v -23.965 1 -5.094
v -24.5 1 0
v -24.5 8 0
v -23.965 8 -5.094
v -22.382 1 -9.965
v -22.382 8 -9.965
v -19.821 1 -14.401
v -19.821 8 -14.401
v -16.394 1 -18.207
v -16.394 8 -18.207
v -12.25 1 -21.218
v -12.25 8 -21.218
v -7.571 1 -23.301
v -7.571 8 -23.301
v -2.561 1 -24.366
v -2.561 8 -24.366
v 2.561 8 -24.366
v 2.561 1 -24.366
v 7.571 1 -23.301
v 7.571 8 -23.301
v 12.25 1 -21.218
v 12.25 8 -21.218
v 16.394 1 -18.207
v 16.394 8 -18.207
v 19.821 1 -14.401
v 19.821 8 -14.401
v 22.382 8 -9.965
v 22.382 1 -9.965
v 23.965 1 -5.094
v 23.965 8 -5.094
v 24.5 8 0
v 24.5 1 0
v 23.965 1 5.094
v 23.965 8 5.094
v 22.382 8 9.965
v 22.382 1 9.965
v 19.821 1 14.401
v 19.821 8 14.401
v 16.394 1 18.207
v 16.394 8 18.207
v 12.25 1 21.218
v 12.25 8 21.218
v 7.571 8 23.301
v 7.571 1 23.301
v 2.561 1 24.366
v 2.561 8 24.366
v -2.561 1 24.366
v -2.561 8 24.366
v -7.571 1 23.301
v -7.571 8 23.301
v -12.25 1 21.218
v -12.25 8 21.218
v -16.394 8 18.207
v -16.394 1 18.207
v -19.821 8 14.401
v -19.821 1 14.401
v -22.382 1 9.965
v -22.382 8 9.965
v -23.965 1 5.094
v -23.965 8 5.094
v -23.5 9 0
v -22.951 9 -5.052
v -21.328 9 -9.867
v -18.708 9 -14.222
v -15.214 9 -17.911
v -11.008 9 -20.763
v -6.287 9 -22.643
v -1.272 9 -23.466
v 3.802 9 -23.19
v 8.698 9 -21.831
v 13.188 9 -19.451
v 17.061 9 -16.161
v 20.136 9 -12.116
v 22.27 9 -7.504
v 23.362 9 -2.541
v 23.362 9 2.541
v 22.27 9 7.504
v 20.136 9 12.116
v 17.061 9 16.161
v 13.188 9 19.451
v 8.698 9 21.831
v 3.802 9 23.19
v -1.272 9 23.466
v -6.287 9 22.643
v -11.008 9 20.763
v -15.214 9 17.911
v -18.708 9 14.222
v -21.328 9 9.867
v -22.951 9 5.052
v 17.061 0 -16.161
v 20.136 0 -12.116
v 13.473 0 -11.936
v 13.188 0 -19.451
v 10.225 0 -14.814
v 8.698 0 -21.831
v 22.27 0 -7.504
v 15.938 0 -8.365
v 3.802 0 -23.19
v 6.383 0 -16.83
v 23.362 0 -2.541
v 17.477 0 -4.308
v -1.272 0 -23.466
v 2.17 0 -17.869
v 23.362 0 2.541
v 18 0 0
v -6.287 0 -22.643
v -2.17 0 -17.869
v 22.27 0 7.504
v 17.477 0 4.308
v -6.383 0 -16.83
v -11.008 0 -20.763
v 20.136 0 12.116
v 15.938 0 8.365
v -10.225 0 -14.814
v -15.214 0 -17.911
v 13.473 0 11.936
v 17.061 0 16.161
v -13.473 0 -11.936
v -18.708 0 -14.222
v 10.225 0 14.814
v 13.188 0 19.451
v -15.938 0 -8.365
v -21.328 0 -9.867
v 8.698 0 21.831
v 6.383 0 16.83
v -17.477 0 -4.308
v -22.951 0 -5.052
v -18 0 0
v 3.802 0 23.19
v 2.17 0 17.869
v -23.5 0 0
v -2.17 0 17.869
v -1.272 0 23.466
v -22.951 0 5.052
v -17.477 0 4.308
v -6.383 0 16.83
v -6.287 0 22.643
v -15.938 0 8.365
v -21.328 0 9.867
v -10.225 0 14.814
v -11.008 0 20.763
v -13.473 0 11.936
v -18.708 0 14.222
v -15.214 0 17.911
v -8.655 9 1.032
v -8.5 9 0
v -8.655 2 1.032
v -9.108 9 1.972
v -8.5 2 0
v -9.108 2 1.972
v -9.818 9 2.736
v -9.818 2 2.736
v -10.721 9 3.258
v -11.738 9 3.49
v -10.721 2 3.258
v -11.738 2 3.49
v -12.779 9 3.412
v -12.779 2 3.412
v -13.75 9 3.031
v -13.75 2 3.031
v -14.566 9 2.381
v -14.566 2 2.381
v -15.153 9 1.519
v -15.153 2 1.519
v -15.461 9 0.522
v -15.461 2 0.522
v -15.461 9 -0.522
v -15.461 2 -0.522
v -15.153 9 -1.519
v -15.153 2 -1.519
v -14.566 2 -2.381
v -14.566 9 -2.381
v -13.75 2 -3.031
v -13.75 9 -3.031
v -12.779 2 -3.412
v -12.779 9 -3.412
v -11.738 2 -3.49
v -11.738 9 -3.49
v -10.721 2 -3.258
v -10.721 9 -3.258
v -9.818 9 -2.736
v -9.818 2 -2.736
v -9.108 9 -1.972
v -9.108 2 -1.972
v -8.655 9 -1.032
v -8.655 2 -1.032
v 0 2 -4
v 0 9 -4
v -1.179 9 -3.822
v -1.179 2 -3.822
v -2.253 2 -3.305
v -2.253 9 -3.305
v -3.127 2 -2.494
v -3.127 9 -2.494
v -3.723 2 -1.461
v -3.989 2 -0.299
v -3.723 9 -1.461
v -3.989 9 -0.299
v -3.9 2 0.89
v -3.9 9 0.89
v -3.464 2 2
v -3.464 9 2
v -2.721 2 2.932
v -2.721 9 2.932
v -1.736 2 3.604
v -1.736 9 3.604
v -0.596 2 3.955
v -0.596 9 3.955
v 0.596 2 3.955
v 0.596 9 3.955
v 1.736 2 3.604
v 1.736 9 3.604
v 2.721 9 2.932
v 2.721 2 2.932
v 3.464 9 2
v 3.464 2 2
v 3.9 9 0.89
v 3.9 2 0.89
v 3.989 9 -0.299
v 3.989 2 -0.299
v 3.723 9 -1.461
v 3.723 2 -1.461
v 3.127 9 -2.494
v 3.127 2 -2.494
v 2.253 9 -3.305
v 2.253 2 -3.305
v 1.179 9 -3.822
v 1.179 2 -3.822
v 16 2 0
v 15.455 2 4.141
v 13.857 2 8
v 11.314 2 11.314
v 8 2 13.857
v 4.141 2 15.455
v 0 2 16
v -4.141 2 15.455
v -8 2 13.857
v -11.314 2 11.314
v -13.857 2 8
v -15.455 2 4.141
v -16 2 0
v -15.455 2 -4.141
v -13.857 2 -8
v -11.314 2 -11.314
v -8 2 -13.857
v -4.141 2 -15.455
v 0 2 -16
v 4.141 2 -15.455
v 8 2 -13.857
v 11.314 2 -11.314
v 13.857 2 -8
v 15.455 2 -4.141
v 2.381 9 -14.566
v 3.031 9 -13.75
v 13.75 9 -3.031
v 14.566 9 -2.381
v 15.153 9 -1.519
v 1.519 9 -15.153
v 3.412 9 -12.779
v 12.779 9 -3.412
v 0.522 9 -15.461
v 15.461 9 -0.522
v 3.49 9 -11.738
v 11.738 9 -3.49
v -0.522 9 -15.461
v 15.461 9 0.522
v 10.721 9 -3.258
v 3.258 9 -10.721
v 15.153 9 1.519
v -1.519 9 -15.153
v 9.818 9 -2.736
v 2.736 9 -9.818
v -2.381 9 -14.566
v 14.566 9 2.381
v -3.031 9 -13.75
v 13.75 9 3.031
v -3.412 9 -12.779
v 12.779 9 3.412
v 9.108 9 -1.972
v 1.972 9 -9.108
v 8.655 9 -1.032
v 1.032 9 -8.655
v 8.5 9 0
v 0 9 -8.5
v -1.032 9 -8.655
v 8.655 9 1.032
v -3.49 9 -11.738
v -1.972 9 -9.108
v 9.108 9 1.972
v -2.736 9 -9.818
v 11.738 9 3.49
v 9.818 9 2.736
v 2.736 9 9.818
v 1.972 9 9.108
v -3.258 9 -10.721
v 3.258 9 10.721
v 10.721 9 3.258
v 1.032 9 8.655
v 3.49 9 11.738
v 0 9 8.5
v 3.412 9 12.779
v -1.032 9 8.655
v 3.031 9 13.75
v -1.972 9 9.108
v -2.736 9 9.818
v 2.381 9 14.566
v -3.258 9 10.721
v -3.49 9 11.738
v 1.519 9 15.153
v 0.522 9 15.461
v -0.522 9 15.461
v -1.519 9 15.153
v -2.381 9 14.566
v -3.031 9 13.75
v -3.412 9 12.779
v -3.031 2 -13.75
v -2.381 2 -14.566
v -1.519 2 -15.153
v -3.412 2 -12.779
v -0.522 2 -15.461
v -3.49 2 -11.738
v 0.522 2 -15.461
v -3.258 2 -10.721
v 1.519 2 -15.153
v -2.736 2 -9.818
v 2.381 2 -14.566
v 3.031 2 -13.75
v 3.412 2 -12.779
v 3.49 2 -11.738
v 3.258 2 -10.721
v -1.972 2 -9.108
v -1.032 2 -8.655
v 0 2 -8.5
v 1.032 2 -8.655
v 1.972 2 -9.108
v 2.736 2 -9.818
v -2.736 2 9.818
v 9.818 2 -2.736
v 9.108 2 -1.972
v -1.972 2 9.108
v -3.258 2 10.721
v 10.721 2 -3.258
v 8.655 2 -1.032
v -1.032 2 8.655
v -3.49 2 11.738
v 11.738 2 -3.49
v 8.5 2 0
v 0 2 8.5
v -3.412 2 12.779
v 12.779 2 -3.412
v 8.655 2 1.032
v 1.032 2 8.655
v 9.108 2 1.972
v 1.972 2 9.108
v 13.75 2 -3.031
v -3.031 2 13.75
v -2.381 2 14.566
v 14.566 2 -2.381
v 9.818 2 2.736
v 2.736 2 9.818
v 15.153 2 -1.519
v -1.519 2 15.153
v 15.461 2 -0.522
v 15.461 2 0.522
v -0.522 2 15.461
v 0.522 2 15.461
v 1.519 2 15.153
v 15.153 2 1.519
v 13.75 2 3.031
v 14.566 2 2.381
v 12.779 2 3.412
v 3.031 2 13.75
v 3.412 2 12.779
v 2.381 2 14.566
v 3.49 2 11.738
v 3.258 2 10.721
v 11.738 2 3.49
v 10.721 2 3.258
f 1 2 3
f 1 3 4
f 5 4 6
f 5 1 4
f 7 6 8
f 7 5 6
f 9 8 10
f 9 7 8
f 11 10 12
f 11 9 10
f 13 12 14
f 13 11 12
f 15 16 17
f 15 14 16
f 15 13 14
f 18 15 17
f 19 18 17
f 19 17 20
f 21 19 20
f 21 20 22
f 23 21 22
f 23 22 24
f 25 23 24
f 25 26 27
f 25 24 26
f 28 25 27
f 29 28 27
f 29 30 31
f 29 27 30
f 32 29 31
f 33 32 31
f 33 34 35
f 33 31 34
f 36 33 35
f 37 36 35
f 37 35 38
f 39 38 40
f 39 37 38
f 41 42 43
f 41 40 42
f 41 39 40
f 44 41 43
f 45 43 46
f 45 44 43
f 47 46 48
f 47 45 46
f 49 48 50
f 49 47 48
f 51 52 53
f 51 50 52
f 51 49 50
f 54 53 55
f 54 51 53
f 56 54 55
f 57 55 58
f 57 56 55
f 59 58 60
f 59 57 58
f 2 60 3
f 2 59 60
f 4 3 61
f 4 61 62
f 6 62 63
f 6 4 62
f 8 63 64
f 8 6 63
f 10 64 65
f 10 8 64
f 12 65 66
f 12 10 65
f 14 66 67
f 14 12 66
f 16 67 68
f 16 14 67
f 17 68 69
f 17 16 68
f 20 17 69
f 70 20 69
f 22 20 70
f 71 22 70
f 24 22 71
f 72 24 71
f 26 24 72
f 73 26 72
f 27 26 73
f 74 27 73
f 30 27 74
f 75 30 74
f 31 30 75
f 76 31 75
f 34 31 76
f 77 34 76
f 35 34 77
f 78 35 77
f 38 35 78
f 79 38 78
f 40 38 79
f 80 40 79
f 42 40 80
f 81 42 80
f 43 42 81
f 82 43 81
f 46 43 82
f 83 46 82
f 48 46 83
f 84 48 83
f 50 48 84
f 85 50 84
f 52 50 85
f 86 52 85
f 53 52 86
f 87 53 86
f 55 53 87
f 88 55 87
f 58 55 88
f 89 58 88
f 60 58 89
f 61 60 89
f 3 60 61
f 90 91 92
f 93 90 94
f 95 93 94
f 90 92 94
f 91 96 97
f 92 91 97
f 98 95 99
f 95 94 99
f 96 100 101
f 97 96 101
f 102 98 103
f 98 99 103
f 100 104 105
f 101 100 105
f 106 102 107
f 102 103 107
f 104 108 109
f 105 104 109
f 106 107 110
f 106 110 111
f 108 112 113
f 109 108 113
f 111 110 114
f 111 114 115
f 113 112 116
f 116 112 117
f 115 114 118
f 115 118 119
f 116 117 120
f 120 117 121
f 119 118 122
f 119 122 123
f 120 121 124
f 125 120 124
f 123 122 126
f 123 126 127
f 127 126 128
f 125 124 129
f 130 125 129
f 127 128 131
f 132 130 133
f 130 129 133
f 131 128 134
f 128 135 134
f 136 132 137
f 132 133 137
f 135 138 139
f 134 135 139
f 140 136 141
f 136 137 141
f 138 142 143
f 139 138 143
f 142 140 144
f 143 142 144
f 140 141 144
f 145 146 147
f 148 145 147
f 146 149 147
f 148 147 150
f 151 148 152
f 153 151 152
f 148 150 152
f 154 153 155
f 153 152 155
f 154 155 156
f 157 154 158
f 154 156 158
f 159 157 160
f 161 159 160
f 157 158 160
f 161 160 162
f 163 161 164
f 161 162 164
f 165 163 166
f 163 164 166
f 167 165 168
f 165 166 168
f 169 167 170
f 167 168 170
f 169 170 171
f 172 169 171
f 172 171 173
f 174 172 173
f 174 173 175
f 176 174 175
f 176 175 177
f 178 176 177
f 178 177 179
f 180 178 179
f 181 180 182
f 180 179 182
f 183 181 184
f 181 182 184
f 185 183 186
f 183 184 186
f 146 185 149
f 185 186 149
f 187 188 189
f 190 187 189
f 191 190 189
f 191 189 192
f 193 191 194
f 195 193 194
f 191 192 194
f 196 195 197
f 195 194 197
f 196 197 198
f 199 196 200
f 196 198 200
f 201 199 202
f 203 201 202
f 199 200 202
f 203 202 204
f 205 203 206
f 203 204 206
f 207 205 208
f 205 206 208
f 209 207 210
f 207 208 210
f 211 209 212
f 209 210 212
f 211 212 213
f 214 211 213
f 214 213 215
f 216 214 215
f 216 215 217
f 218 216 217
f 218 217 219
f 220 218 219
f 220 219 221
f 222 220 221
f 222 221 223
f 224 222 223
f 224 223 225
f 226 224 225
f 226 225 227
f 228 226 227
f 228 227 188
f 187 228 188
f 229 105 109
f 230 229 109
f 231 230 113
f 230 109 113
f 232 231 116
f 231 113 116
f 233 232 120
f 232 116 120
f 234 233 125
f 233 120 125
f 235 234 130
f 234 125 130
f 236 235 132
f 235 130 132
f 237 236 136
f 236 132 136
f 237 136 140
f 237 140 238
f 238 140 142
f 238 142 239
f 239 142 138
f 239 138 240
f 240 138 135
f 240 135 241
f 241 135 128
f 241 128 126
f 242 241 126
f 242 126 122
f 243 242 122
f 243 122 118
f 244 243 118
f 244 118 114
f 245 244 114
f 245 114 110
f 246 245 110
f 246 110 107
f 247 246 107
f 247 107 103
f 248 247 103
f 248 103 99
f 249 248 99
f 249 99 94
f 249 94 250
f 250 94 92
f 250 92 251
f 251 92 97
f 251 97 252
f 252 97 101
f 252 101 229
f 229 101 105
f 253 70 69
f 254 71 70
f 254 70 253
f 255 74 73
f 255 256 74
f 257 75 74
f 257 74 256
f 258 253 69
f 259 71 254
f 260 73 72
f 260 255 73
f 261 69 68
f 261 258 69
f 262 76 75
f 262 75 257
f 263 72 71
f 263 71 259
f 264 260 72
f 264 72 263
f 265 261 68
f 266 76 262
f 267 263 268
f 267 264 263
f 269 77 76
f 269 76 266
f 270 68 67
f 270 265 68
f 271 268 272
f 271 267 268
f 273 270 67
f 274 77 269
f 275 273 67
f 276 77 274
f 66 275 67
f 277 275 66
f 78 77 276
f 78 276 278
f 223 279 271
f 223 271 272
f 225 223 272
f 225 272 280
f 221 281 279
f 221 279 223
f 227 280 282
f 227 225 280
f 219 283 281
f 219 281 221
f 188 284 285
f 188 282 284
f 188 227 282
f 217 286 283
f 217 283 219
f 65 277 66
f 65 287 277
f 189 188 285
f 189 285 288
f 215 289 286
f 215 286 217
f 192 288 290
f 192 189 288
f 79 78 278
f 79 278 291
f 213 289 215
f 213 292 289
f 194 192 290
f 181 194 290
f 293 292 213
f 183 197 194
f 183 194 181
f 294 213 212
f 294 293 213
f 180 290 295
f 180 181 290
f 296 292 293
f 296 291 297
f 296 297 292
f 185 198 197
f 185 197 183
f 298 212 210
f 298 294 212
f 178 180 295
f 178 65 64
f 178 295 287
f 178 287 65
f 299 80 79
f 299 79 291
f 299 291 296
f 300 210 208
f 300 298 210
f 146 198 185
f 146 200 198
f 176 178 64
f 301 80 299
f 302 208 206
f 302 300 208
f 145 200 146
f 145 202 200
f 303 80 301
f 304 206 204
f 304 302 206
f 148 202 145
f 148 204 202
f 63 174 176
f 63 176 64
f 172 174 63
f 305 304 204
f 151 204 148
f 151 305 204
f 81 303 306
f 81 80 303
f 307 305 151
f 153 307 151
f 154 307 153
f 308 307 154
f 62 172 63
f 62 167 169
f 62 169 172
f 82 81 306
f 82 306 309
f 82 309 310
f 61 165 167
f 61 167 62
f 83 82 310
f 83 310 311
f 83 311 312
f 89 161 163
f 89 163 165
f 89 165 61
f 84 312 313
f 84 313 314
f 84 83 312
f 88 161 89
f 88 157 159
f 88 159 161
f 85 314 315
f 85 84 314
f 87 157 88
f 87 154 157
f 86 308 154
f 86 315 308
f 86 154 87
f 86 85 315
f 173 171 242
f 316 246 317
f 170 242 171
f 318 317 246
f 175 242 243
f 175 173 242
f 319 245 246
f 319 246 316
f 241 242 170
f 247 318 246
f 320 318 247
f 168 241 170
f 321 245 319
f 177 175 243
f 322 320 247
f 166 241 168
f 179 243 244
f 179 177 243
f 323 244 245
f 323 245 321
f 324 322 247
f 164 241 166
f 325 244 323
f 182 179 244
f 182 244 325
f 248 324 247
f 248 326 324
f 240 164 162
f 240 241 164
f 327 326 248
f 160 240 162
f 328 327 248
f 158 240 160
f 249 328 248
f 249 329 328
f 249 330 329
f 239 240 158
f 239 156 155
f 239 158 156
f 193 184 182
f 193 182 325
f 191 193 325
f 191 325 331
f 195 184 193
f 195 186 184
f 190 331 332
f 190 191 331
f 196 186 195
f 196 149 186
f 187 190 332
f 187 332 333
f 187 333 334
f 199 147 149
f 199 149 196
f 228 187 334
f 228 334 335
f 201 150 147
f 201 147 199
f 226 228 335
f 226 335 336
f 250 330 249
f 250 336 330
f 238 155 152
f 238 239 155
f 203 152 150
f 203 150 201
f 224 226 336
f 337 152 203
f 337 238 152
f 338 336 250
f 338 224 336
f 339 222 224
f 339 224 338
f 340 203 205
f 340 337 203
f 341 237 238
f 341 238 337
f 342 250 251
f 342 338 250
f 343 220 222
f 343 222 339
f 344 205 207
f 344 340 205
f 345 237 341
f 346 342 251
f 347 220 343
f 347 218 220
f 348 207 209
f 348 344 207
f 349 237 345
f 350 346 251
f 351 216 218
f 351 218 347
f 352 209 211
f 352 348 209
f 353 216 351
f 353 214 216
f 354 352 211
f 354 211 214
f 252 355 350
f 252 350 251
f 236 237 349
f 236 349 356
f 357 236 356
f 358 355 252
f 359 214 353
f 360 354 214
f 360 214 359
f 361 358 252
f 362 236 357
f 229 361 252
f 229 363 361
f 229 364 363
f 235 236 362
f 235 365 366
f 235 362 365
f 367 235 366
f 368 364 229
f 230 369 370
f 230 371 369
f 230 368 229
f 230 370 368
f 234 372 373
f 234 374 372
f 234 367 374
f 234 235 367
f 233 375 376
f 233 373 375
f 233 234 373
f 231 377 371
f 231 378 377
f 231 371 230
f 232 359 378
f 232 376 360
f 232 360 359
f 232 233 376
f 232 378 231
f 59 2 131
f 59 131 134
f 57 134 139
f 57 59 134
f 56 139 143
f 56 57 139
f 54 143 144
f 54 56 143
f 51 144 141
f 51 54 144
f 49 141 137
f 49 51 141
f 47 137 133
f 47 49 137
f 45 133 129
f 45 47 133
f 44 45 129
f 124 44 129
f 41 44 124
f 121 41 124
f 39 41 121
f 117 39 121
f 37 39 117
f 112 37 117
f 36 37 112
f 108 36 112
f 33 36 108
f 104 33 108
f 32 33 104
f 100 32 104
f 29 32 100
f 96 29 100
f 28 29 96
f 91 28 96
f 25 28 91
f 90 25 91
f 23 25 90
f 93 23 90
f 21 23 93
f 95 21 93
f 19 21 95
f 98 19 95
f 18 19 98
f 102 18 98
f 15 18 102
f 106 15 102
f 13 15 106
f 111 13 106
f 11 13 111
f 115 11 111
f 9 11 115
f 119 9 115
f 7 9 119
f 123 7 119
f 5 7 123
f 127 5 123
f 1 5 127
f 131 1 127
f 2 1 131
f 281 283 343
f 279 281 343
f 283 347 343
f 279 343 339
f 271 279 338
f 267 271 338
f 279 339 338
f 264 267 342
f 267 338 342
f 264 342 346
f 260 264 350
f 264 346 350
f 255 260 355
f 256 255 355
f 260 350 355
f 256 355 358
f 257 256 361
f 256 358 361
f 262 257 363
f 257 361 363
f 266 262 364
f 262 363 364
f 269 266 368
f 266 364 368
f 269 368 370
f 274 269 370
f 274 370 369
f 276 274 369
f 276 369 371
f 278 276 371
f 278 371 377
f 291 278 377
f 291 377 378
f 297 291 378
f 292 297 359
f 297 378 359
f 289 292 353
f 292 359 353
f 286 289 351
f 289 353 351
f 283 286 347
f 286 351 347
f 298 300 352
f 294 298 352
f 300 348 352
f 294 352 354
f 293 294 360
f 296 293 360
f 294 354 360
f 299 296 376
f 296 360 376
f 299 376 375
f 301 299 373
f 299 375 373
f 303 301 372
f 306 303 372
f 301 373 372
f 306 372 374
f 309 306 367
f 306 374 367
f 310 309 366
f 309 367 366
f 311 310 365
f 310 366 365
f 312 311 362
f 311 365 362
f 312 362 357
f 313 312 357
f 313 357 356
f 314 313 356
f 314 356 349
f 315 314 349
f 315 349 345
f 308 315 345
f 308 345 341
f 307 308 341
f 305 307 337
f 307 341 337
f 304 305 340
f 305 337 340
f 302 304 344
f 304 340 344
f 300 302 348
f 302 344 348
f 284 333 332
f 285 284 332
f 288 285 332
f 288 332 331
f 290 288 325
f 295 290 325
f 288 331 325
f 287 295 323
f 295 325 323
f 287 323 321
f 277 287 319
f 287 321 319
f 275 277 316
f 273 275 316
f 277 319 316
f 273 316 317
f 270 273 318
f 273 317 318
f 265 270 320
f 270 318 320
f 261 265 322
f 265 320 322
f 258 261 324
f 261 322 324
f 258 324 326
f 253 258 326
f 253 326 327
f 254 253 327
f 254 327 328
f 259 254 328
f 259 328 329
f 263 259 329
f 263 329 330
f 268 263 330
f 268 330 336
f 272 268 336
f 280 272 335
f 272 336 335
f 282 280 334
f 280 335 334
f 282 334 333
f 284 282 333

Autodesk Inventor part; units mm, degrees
ref_plane "YZ Plane" through (0, 0, 0) normal (1, 0, 0) x (0, 1, 0)
ref_plane "XZ Plane" through (0, 0, 0) normal (0, 1, 0) x (-1, 0, 0)
ref_plane "XY Plane" through (0, 0, 0) normal (0, 0, 1) x (1, 0, 0)
sketch "Sketch1" plane through (0, 0, 0) normal (0, 1, 0) x (-1, 0, 0)
  circle A0 centre (0, 0) radius 24.5
  dimension "d0" = 49
extrude "Extrusion1" add sketch "Sketch1" along normal blind 9
sketch "Sketch2" plane through (0, 0, 0) normal (0, -1, 0) x (1, 0, 0)
  point P0 (0, 0)
sketch "Sketch3" plane through (0, 0, 0) normal (0, -1, 0) x (1, 0, 0)
  circle A0 centre (0, 0) radius 18
  dimension "d3" = 36
extrude "Extrusion2" cut sketch "Sketch3" against normal blind 2
chamfer "Chamfer1" distance 2 angle 45 1 edges at (-18, 2, 0)
hole "Hole1" at (0, 0, 0) direction (0, 1, 0) diameter 8 end through all
sketch "Sketch4" plane through (0, 2, 0) normal (0, -1, 0) x (1, 0, 0)
  circle A0 centre (-12, 0) radius 3.5
  point P0 (0, 0)
  dimension "d17" = 7
  dimension "d18" = 12
extrude "Extrusion3" cut sketch "Sketch4" against normal through all
pattern_circular "Circular Pattern1" count 4 over 360 about axis through (0, -10, 0) along (0, 1, 0) of "Extrusion3"
chamfer "Chamfer2" distance 1 angle 45 2 edges at (24.5, 0, 0) (24.5, 9, 0)
properties part number "Wheel" material "Iron, Gray"
